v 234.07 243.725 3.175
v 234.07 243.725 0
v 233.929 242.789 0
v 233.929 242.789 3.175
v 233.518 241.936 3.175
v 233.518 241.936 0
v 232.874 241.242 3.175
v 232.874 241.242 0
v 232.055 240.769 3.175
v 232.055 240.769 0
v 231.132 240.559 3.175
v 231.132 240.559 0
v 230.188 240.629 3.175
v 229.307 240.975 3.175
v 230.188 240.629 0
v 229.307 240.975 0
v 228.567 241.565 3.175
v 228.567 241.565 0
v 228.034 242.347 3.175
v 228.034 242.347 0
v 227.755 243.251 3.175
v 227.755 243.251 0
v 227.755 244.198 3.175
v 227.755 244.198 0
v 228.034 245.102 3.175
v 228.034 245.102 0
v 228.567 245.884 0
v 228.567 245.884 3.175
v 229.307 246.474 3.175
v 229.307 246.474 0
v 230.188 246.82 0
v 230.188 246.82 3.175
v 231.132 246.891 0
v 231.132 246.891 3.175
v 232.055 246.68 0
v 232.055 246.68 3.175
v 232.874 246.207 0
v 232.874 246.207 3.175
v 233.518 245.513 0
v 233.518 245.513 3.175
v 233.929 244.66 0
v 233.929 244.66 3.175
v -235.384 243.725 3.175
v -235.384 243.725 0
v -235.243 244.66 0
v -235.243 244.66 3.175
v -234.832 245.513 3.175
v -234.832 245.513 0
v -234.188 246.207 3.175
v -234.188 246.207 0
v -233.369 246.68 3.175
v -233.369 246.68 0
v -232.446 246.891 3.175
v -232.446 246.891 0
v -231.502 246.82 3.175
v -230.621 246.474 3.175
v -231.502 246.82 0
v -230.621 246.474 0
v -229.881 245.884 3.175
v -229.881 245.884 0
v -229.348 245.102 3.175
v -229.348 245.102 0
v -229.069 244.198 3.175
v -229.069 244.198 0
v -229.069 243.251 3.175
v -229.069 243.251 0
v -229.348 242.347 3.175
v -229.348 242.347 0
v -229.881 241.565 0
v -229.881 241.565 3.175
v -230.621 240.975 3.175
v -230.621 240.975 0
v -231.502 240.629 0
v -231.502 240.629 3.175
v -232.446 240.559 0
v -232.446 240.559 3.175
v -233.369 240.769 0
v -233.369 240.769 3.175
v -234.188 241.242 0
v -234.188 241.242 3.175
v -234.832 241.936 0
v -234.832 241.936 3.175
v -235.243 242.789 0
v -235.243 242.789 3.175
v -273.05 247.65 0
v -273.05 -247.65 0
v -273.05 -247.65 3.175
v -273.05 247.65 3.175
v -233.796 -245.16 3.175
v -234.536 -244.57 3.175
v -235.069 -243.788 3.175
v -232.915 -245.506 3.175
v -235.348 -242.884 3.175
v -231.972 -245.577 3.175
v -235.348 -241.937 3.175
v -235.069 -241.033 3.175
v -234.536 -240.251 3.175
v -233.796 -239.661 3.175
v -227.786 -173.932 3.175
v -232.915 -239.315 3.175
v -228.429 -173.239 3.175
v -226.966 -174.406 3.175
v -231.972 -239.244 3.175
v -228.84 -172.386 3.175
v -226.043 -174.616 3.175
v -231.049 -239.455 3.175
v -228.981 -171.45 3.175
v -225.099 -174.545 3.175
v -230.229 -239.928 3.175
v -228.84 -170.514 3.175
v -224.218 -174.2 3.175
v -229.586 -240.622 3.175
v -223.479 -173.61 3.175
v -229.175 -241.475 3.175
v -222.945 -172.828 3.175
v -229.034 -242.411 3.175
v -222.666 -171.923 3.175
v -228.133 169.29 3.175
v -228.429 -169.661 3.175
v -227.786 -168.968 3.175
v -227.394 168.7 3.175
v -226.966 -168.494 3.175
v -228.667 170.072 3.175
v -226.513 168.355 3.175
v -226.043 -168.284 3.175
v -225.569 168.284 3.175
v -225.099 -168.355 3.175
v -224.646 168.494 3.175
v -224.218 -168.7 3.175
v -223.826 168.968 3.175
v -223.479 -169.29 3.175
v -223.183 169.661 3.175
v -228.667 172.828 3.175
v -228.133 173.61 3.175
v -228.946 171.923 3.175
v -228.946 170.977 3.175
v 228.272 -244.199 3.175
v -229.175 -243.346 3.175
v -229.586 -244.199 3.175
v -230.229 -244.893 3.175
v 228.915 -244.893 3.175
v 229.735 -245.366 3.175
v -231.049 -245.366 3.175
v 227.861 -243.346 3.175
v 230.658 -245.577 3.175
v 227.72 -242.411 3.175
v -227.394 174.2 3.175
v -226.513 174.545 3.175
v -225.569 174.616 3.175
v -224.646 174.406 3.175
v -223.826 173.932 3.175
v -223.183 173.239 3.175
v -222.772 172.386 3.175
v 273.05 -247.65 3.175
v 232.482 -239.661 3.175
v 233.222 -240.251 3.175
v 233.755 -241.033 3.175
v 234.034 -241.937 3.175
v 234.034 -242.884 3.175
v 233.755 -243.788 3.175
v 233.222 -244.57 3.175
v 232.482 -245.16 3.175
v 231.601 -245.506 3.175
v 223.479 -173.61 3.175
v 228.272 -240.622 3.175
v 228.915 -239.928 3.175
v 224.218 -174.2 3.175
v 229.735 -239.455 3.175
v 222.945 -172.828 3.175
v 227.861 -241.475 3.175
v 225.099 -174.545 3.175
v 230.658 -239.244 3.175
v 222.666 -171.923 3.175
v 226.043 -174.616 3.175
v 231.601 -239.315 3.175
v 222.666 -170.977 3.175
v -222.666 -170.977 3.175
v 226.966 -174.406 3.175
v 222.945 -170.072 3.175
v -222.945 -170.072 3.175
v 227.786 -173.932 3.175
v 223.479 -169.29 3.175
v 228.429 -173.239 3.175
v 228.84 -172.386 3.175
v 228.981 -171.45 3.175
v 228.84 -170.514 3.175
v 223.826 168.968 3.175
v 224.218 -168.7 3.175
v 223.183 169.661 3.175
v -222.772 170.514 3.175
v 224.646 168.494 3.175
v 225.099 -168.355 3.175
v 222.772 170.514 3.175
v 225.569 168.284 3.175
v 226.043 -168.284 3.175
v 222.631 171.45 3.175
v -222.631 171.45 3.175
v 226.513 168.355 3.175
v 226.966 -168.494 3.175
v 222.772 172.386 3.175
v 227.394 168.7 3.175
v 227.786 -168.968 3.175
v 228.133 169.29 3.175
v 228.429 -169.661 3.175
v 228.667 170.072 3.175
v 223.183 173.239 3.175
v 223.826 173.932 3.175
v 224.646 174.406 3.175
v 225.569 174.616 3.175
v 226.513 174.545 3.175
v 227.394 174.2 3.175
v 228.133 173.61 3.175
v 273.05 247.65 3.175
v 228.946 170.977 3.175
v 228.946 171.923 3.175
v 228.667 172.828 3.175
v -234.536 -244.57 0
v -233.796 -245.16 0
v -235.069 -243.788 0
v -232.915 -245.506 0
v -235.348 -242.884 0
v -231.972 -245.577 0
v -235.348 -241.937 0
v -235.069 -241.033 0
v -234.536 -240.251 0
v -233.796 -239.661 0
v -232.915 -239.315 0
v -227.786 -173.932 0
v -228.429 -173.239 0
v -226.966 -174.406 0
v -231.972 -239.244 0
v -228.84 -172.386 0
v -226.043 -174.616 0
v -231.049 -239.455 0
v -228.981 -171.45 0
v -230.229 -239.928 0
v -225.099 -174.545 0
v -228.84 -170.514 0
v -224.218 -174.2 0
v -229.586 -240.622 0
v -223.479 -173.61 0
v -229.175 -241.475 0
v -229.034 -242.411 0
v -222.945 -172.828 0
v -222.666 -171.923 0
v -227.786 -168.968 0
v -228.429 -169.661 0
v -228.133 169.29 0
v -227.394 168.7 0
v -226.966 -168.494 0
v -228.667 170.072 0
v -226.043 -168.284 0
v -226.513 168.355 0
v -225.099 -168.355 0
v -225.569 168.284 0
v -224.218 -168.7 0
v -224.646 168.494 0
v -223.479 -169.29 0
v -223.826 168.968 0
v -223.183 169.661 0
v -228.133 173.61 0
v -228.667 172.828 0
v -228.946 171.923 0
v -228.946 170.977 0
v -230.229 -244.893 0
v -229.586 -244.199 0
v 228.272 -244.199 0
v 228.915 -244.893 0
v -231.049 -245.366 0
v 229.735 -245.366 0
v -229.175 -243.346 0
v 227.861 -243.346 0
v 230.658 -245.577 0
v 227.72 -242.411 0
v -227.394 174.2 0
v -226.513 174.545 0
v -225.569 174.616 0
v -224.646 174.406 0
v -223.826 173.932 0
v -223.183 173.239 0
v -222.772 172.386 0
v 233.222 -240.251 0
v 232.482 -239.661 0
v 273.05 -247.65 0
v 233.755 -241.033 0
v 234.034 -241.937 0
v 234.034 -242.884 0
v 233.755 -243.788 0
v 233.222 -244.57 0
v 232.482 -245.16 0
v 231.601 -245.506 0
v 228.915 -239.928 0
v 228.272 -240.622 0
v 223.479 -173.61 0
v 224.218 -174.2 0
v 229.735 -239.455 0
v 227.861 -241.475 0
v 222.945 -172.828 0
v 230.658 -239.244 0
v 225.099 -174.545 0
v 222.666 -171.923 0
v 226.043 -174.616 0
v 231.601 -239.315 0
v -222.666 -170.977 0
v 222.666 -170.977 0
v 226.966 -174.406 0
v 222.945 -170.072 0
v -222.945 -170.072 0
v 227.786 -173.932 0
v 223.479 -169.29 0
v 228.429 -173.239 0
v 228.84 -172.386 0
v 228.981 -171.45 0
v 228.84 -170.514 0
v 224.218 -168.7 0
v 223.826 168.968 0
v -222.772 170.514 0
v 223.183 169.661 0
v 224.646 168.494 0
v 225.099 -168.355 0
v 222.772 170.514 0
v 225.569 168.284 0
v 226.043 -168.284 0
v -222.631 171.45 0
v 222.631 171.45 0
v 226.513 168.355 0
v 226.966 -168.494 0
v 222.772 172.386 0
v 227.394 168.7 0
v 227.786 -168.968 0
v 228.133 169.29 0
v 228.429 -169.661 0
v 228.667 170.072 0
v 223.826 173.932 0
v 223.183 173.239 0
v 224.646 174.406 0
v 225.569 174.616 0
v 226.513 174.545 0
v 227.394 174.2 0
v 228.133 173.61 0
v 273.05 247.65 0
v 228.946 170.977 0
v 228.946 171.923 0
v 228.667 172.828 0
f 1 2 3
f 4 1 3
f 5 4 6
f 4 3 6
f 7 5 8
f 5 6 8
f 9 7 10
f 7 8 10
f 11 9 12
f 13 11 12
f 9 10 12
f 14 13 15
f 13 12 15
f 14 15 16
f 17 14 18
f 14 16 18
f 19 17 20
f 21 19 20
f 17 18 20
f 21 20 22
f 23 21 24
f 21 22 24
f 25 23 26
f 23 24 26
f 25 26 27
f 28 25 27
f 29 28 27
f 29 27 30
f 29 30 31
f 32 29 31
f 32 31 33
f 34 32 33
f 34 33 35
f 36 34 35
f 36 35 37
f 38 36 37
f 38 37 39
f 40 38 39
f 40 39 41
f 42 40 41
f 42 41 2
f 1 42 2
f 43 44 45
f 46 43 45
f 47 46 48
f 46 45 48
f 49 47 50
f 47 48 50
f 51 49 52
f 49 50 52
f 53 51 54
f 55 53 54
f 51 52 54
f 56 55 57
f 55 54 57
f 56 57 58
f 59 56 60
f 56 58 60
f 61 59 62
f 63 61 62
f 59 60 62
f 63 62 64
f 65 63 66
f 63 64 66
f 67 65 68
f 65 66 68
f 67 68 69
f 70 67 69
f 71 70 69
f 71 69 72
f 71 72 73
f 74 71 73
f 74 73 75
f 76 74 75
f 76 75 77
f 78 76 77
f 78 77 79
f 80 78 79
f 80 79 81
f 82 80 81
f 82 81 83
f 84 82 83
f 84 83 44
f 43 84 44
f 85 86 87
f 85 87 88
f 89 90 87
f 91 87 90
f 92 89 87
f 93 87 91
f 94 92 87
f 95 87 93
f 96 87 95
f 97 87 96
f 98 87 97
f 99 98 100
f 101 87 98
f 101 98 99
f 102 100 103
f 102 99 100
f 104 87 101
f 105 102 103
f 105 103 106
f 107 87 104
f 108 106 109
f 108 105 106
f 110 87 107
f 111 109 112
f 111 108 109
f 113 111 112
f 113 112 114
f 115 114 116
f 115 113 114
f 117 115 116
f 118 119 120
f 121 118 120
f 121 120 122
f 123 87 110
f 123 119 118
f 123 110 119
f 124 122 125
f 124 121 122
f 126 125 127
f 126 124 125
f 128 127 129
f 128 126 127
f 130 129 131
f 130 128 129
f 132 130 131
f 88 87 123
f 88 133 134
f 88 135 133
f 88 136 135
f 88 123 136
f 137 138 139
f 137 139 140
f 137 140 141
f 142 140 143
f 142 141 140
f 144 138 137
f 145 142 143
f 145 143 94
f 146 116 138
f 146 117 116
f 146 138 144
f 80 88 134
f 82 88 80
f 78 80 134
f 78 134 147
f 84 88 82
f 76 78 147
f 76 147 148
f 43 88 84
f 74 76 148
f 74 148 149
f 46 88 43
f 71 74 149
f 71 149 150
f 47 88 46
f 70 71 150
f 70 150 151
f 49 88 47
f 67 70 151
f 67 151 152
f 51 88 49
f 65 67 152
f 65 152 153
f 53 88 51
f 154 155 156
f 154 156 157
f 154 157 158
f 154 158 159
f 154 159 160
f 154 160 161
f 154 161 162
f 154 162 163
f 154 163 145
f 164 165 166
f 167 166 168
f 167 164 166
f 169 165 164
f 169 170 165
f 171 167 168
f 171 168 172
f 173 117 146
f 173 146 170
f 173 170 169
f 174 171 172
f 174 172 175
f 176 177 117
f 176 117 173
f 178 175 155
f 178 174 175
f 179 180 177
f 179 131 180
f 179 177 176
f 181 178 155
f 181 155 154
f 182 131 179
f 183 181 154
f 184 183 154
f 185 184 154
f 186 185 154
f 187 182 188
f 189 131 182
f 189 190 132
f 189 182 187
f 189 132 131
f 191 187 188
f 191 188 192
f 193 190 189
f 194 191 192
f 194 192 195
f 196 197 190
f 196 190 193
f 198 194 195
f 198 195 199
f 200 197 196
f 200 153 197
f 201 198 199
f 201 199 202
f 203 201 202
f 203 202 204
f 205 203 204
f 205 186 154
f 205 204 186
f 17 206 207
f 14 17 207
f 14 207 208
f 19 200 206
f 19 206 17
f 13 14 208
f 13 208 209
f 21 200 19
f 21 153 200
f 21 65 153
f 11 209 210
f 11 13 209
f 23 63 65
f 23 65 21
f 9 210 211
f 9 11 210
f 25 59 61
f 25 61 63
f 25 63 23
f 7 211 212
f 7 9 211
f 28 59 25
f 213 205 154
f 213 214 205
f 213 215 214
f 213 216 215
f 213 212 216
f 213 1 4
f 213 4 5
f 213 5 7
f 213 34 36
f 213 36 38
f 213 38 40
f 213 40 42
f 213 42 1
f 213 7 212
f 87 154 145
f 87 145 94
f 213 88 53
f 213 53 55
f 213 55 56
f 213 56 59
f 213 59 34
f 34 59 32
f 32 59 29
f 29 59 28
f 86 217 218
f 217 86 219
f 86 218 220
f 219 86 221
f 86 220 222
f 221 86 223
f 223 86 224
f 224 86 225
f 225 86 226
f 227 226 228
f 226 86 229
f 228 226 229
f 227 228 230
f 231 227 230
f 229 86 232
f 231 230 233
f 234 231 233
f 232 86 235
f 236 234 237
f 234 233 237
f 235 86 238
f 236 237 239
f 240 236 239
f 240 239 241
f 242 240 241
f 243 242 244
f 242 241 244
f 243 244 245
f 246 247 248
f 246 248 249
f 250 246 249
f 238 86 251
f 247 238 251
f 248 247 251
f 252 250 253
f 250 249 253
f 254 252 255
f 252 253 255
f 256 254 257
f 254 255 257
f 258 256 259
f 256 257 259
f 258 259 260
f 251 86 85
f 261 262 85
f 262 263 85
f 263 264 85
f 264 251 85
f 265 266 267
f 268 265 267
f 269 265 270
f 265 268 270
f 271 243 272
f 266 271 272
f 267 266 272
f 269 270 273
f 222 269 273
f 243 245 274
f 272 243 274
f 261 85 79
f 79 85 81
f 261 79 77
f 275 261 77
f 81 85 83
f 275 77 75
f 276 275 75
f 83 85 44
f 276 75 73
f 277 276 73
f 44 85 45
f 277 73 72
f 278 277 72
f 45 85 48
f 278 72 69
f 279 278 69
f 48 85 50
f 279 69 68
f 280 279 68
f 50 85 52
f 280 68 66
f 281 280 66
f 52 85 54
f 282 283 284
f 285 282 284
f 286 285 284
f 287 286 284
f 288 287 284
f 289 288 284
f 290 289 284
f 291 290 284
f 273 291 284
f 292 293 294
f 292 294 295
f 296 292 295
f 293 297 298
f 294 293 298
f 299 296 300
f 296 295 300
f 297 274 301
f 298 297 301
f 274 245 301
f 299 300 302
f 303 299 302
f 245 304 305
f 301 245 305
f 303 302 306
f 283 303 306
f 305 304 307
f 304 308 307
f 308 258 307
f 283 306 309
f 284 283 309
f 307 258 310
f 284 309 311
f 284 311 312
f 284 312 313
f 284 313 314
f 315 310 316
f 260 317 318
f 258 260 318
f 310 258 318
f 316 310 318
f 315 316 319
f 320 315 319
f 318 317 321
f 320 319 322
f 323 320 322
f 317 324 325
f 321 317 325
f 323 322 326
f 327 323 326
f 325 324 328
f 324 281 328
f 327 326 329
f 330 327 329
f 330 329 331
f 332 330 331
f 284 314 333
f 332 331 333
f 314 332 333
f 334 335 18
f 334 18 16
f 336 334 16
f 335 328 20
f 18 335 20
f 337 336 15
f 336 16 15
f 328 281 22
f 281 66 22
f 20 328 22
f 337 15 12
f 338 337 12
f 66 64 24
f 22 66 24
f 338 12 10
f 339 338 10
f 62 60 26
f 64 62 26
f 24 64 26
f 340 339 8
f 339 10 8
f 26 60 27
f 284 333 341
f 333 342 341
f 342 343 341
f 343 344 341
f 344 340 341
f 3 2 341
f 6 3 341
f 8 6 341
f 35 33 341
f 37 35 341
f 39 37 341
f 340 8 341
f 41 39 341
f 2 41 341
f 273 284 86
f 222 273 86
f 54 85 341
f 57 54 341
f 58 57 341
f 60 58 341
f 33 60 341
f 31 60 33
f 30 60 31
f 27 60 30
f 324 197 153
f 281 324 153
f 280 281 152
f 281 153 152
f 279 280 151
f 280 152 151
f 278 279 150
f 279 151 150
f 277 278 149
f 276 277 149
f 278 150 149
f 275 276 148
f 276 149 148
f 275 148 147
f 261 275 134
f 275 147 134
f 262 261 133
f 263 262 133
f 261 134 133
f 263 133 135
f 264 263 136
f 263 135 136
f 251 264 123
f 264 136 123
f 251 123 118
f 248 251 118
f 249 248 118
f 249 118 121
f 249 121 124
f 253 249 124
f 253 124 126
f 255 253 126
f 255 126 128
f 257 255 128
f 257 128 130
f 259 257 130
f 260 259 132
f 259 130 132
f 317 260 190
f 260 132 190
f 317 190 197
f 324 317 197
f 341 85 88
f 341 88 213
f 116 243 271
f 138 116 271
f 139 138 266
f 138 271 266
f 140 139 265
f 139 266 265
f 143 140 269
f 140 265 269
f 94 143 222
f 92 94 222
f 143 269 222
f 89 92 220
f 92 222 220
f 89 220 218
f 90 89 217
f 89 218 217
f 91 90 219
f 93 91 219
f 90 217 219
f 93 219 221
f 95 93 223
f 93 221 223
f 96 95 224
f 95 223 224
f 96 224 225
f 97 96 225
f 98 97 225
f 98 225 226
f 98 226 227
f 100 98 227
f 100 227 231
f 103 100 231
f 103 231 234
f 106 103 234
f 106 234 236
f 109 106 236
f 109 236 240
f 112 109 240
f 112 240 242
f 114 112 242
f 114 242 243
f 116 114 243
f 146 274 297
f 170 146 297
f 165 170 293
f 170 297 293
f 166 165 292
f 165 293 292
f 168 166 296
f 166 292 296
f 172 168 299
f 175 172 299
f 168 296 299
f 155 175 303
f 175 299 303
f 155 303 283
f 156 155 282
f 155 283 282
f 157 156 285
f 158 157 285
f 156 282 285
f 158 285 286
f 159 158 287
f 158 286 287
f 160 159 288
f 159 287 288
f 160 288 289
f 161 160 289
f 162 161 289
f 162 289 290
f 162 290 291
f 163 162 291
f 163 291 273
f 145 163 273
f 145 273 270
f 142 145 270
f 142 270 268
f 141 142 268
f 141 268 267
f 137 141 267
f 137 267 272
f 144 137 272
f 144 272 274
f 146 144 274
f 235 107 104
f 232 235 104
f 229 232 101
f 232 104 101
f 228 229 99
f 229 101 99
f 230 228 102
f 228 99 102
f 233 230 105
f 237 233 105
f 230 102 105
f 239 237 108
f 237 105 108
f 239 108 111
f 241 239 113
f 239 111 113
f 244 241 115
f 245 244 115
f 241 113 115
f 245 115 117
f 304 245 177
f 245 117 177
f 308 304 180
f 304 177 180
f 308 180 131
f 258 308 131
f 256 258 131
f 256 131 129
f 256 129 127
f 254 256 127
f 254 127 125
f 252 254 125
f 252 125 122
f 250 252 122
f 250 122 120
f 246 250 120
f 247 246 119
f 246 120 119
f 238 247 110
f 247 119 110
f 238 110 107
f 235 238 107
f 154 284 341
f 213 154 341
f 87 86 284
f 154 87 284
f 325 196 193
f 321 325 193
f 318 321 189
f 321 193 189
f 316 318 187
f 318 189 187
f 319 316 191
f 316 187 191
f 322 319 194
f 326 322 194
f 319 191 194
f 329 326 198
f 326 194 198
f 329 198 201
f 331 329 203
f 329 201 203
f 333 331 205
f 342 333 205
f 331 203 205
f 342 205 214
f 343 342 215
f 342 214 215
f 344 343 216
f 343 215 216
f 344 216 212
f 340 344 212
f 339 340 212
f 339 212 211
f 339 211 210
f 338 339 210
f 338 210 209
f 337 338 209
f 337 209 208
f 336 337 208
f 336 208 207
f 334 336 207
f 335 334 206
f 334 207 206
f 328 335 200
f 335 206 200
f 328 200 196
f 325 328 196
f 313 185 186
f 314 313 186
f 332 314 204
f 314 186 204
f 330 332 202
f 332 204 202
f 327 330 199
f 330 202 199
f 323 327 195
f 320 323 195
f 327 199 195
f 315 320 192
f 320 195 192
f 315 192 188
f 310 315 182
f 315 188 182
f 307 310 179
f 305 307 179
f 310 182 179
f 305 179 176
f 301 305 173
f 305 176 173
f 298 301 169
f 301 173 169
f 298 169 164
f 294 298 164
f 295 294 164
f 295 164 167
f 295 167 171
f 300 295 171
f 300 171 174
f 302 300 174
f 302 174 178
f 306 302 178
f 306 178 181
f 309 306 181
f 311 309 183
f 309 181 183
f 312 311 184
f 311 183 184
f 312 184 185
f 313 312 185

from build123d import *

# Parameters (mm, degrees)
SKETCH1_W           = 546.1
SKETCH1_H           = 495.3
BOSS_EXTRUDE1_DEPTH = 3.175
SKETCH3_R           = 3.175
CUT_EXTRUDE2_DEPTH  = 3.175
SKETCH6_R           = 3.175
CUT_EXTRUDE3_DEPTH  = 6.35


with BuildPart() as part:
    # Sketch1 → Boss-Extrude1 (new body)
    with BuildSketch(Plane.XY):
        Rectangle(SKETCH1_W, SKETCH1_H)
    extrude(amount=BOSS_EXTRUDE1_DEPTH)

    # Sketch3 → Cut-Extrude2 (cut)
    with BuildSketch(Plane.XY.offset(3.175)):
        with Locations((-225.806, 171.45)):
            Circle(SKETCH3_R)
        with Locations(Location((225.806, 171.45, 0), (0, 0, 180))):
            Circle(SKETCH3_R)
        with Locations((225.806, -171.45)):
            Circle(SKETCH3_R)
        with Locations(Location((-225.806, -171.45, 0), (0, 0, 180))):
            Circle(SKETCH3_R)
    extrude(amount=-CUT_EXTRUDE2_DEPTH, mode=Mode.SUBTRACT)

    # Sketch6 → Cut-Extrude3 (cut)
    with BuildSketch(Plane(origin=(0, 0, 0), x_dir=(-1, 0, 0), z_dir=(0, 0, -1))):
        with Locations((-230.894832538, -242.410608142)):
            Circle(SKETCH6_R)
        with Locations(Location((-230.894832538, 243.724649044, 0), (0, 0, 180))):
            Circle(SKETCH6_R)
        with Locations(Location((232.20887344, -242.410608142, 0), (0, 0, 180))):
            Circle(SKETCH6_R)
        with Locations((232.20887344, 243.724649044)):
            Circle(SKETCH6_R)
    extrude(amount=-CUT_EXTRUDE3_DEPTH, mode=Mode.SUBTRACT)


solid = part.part
